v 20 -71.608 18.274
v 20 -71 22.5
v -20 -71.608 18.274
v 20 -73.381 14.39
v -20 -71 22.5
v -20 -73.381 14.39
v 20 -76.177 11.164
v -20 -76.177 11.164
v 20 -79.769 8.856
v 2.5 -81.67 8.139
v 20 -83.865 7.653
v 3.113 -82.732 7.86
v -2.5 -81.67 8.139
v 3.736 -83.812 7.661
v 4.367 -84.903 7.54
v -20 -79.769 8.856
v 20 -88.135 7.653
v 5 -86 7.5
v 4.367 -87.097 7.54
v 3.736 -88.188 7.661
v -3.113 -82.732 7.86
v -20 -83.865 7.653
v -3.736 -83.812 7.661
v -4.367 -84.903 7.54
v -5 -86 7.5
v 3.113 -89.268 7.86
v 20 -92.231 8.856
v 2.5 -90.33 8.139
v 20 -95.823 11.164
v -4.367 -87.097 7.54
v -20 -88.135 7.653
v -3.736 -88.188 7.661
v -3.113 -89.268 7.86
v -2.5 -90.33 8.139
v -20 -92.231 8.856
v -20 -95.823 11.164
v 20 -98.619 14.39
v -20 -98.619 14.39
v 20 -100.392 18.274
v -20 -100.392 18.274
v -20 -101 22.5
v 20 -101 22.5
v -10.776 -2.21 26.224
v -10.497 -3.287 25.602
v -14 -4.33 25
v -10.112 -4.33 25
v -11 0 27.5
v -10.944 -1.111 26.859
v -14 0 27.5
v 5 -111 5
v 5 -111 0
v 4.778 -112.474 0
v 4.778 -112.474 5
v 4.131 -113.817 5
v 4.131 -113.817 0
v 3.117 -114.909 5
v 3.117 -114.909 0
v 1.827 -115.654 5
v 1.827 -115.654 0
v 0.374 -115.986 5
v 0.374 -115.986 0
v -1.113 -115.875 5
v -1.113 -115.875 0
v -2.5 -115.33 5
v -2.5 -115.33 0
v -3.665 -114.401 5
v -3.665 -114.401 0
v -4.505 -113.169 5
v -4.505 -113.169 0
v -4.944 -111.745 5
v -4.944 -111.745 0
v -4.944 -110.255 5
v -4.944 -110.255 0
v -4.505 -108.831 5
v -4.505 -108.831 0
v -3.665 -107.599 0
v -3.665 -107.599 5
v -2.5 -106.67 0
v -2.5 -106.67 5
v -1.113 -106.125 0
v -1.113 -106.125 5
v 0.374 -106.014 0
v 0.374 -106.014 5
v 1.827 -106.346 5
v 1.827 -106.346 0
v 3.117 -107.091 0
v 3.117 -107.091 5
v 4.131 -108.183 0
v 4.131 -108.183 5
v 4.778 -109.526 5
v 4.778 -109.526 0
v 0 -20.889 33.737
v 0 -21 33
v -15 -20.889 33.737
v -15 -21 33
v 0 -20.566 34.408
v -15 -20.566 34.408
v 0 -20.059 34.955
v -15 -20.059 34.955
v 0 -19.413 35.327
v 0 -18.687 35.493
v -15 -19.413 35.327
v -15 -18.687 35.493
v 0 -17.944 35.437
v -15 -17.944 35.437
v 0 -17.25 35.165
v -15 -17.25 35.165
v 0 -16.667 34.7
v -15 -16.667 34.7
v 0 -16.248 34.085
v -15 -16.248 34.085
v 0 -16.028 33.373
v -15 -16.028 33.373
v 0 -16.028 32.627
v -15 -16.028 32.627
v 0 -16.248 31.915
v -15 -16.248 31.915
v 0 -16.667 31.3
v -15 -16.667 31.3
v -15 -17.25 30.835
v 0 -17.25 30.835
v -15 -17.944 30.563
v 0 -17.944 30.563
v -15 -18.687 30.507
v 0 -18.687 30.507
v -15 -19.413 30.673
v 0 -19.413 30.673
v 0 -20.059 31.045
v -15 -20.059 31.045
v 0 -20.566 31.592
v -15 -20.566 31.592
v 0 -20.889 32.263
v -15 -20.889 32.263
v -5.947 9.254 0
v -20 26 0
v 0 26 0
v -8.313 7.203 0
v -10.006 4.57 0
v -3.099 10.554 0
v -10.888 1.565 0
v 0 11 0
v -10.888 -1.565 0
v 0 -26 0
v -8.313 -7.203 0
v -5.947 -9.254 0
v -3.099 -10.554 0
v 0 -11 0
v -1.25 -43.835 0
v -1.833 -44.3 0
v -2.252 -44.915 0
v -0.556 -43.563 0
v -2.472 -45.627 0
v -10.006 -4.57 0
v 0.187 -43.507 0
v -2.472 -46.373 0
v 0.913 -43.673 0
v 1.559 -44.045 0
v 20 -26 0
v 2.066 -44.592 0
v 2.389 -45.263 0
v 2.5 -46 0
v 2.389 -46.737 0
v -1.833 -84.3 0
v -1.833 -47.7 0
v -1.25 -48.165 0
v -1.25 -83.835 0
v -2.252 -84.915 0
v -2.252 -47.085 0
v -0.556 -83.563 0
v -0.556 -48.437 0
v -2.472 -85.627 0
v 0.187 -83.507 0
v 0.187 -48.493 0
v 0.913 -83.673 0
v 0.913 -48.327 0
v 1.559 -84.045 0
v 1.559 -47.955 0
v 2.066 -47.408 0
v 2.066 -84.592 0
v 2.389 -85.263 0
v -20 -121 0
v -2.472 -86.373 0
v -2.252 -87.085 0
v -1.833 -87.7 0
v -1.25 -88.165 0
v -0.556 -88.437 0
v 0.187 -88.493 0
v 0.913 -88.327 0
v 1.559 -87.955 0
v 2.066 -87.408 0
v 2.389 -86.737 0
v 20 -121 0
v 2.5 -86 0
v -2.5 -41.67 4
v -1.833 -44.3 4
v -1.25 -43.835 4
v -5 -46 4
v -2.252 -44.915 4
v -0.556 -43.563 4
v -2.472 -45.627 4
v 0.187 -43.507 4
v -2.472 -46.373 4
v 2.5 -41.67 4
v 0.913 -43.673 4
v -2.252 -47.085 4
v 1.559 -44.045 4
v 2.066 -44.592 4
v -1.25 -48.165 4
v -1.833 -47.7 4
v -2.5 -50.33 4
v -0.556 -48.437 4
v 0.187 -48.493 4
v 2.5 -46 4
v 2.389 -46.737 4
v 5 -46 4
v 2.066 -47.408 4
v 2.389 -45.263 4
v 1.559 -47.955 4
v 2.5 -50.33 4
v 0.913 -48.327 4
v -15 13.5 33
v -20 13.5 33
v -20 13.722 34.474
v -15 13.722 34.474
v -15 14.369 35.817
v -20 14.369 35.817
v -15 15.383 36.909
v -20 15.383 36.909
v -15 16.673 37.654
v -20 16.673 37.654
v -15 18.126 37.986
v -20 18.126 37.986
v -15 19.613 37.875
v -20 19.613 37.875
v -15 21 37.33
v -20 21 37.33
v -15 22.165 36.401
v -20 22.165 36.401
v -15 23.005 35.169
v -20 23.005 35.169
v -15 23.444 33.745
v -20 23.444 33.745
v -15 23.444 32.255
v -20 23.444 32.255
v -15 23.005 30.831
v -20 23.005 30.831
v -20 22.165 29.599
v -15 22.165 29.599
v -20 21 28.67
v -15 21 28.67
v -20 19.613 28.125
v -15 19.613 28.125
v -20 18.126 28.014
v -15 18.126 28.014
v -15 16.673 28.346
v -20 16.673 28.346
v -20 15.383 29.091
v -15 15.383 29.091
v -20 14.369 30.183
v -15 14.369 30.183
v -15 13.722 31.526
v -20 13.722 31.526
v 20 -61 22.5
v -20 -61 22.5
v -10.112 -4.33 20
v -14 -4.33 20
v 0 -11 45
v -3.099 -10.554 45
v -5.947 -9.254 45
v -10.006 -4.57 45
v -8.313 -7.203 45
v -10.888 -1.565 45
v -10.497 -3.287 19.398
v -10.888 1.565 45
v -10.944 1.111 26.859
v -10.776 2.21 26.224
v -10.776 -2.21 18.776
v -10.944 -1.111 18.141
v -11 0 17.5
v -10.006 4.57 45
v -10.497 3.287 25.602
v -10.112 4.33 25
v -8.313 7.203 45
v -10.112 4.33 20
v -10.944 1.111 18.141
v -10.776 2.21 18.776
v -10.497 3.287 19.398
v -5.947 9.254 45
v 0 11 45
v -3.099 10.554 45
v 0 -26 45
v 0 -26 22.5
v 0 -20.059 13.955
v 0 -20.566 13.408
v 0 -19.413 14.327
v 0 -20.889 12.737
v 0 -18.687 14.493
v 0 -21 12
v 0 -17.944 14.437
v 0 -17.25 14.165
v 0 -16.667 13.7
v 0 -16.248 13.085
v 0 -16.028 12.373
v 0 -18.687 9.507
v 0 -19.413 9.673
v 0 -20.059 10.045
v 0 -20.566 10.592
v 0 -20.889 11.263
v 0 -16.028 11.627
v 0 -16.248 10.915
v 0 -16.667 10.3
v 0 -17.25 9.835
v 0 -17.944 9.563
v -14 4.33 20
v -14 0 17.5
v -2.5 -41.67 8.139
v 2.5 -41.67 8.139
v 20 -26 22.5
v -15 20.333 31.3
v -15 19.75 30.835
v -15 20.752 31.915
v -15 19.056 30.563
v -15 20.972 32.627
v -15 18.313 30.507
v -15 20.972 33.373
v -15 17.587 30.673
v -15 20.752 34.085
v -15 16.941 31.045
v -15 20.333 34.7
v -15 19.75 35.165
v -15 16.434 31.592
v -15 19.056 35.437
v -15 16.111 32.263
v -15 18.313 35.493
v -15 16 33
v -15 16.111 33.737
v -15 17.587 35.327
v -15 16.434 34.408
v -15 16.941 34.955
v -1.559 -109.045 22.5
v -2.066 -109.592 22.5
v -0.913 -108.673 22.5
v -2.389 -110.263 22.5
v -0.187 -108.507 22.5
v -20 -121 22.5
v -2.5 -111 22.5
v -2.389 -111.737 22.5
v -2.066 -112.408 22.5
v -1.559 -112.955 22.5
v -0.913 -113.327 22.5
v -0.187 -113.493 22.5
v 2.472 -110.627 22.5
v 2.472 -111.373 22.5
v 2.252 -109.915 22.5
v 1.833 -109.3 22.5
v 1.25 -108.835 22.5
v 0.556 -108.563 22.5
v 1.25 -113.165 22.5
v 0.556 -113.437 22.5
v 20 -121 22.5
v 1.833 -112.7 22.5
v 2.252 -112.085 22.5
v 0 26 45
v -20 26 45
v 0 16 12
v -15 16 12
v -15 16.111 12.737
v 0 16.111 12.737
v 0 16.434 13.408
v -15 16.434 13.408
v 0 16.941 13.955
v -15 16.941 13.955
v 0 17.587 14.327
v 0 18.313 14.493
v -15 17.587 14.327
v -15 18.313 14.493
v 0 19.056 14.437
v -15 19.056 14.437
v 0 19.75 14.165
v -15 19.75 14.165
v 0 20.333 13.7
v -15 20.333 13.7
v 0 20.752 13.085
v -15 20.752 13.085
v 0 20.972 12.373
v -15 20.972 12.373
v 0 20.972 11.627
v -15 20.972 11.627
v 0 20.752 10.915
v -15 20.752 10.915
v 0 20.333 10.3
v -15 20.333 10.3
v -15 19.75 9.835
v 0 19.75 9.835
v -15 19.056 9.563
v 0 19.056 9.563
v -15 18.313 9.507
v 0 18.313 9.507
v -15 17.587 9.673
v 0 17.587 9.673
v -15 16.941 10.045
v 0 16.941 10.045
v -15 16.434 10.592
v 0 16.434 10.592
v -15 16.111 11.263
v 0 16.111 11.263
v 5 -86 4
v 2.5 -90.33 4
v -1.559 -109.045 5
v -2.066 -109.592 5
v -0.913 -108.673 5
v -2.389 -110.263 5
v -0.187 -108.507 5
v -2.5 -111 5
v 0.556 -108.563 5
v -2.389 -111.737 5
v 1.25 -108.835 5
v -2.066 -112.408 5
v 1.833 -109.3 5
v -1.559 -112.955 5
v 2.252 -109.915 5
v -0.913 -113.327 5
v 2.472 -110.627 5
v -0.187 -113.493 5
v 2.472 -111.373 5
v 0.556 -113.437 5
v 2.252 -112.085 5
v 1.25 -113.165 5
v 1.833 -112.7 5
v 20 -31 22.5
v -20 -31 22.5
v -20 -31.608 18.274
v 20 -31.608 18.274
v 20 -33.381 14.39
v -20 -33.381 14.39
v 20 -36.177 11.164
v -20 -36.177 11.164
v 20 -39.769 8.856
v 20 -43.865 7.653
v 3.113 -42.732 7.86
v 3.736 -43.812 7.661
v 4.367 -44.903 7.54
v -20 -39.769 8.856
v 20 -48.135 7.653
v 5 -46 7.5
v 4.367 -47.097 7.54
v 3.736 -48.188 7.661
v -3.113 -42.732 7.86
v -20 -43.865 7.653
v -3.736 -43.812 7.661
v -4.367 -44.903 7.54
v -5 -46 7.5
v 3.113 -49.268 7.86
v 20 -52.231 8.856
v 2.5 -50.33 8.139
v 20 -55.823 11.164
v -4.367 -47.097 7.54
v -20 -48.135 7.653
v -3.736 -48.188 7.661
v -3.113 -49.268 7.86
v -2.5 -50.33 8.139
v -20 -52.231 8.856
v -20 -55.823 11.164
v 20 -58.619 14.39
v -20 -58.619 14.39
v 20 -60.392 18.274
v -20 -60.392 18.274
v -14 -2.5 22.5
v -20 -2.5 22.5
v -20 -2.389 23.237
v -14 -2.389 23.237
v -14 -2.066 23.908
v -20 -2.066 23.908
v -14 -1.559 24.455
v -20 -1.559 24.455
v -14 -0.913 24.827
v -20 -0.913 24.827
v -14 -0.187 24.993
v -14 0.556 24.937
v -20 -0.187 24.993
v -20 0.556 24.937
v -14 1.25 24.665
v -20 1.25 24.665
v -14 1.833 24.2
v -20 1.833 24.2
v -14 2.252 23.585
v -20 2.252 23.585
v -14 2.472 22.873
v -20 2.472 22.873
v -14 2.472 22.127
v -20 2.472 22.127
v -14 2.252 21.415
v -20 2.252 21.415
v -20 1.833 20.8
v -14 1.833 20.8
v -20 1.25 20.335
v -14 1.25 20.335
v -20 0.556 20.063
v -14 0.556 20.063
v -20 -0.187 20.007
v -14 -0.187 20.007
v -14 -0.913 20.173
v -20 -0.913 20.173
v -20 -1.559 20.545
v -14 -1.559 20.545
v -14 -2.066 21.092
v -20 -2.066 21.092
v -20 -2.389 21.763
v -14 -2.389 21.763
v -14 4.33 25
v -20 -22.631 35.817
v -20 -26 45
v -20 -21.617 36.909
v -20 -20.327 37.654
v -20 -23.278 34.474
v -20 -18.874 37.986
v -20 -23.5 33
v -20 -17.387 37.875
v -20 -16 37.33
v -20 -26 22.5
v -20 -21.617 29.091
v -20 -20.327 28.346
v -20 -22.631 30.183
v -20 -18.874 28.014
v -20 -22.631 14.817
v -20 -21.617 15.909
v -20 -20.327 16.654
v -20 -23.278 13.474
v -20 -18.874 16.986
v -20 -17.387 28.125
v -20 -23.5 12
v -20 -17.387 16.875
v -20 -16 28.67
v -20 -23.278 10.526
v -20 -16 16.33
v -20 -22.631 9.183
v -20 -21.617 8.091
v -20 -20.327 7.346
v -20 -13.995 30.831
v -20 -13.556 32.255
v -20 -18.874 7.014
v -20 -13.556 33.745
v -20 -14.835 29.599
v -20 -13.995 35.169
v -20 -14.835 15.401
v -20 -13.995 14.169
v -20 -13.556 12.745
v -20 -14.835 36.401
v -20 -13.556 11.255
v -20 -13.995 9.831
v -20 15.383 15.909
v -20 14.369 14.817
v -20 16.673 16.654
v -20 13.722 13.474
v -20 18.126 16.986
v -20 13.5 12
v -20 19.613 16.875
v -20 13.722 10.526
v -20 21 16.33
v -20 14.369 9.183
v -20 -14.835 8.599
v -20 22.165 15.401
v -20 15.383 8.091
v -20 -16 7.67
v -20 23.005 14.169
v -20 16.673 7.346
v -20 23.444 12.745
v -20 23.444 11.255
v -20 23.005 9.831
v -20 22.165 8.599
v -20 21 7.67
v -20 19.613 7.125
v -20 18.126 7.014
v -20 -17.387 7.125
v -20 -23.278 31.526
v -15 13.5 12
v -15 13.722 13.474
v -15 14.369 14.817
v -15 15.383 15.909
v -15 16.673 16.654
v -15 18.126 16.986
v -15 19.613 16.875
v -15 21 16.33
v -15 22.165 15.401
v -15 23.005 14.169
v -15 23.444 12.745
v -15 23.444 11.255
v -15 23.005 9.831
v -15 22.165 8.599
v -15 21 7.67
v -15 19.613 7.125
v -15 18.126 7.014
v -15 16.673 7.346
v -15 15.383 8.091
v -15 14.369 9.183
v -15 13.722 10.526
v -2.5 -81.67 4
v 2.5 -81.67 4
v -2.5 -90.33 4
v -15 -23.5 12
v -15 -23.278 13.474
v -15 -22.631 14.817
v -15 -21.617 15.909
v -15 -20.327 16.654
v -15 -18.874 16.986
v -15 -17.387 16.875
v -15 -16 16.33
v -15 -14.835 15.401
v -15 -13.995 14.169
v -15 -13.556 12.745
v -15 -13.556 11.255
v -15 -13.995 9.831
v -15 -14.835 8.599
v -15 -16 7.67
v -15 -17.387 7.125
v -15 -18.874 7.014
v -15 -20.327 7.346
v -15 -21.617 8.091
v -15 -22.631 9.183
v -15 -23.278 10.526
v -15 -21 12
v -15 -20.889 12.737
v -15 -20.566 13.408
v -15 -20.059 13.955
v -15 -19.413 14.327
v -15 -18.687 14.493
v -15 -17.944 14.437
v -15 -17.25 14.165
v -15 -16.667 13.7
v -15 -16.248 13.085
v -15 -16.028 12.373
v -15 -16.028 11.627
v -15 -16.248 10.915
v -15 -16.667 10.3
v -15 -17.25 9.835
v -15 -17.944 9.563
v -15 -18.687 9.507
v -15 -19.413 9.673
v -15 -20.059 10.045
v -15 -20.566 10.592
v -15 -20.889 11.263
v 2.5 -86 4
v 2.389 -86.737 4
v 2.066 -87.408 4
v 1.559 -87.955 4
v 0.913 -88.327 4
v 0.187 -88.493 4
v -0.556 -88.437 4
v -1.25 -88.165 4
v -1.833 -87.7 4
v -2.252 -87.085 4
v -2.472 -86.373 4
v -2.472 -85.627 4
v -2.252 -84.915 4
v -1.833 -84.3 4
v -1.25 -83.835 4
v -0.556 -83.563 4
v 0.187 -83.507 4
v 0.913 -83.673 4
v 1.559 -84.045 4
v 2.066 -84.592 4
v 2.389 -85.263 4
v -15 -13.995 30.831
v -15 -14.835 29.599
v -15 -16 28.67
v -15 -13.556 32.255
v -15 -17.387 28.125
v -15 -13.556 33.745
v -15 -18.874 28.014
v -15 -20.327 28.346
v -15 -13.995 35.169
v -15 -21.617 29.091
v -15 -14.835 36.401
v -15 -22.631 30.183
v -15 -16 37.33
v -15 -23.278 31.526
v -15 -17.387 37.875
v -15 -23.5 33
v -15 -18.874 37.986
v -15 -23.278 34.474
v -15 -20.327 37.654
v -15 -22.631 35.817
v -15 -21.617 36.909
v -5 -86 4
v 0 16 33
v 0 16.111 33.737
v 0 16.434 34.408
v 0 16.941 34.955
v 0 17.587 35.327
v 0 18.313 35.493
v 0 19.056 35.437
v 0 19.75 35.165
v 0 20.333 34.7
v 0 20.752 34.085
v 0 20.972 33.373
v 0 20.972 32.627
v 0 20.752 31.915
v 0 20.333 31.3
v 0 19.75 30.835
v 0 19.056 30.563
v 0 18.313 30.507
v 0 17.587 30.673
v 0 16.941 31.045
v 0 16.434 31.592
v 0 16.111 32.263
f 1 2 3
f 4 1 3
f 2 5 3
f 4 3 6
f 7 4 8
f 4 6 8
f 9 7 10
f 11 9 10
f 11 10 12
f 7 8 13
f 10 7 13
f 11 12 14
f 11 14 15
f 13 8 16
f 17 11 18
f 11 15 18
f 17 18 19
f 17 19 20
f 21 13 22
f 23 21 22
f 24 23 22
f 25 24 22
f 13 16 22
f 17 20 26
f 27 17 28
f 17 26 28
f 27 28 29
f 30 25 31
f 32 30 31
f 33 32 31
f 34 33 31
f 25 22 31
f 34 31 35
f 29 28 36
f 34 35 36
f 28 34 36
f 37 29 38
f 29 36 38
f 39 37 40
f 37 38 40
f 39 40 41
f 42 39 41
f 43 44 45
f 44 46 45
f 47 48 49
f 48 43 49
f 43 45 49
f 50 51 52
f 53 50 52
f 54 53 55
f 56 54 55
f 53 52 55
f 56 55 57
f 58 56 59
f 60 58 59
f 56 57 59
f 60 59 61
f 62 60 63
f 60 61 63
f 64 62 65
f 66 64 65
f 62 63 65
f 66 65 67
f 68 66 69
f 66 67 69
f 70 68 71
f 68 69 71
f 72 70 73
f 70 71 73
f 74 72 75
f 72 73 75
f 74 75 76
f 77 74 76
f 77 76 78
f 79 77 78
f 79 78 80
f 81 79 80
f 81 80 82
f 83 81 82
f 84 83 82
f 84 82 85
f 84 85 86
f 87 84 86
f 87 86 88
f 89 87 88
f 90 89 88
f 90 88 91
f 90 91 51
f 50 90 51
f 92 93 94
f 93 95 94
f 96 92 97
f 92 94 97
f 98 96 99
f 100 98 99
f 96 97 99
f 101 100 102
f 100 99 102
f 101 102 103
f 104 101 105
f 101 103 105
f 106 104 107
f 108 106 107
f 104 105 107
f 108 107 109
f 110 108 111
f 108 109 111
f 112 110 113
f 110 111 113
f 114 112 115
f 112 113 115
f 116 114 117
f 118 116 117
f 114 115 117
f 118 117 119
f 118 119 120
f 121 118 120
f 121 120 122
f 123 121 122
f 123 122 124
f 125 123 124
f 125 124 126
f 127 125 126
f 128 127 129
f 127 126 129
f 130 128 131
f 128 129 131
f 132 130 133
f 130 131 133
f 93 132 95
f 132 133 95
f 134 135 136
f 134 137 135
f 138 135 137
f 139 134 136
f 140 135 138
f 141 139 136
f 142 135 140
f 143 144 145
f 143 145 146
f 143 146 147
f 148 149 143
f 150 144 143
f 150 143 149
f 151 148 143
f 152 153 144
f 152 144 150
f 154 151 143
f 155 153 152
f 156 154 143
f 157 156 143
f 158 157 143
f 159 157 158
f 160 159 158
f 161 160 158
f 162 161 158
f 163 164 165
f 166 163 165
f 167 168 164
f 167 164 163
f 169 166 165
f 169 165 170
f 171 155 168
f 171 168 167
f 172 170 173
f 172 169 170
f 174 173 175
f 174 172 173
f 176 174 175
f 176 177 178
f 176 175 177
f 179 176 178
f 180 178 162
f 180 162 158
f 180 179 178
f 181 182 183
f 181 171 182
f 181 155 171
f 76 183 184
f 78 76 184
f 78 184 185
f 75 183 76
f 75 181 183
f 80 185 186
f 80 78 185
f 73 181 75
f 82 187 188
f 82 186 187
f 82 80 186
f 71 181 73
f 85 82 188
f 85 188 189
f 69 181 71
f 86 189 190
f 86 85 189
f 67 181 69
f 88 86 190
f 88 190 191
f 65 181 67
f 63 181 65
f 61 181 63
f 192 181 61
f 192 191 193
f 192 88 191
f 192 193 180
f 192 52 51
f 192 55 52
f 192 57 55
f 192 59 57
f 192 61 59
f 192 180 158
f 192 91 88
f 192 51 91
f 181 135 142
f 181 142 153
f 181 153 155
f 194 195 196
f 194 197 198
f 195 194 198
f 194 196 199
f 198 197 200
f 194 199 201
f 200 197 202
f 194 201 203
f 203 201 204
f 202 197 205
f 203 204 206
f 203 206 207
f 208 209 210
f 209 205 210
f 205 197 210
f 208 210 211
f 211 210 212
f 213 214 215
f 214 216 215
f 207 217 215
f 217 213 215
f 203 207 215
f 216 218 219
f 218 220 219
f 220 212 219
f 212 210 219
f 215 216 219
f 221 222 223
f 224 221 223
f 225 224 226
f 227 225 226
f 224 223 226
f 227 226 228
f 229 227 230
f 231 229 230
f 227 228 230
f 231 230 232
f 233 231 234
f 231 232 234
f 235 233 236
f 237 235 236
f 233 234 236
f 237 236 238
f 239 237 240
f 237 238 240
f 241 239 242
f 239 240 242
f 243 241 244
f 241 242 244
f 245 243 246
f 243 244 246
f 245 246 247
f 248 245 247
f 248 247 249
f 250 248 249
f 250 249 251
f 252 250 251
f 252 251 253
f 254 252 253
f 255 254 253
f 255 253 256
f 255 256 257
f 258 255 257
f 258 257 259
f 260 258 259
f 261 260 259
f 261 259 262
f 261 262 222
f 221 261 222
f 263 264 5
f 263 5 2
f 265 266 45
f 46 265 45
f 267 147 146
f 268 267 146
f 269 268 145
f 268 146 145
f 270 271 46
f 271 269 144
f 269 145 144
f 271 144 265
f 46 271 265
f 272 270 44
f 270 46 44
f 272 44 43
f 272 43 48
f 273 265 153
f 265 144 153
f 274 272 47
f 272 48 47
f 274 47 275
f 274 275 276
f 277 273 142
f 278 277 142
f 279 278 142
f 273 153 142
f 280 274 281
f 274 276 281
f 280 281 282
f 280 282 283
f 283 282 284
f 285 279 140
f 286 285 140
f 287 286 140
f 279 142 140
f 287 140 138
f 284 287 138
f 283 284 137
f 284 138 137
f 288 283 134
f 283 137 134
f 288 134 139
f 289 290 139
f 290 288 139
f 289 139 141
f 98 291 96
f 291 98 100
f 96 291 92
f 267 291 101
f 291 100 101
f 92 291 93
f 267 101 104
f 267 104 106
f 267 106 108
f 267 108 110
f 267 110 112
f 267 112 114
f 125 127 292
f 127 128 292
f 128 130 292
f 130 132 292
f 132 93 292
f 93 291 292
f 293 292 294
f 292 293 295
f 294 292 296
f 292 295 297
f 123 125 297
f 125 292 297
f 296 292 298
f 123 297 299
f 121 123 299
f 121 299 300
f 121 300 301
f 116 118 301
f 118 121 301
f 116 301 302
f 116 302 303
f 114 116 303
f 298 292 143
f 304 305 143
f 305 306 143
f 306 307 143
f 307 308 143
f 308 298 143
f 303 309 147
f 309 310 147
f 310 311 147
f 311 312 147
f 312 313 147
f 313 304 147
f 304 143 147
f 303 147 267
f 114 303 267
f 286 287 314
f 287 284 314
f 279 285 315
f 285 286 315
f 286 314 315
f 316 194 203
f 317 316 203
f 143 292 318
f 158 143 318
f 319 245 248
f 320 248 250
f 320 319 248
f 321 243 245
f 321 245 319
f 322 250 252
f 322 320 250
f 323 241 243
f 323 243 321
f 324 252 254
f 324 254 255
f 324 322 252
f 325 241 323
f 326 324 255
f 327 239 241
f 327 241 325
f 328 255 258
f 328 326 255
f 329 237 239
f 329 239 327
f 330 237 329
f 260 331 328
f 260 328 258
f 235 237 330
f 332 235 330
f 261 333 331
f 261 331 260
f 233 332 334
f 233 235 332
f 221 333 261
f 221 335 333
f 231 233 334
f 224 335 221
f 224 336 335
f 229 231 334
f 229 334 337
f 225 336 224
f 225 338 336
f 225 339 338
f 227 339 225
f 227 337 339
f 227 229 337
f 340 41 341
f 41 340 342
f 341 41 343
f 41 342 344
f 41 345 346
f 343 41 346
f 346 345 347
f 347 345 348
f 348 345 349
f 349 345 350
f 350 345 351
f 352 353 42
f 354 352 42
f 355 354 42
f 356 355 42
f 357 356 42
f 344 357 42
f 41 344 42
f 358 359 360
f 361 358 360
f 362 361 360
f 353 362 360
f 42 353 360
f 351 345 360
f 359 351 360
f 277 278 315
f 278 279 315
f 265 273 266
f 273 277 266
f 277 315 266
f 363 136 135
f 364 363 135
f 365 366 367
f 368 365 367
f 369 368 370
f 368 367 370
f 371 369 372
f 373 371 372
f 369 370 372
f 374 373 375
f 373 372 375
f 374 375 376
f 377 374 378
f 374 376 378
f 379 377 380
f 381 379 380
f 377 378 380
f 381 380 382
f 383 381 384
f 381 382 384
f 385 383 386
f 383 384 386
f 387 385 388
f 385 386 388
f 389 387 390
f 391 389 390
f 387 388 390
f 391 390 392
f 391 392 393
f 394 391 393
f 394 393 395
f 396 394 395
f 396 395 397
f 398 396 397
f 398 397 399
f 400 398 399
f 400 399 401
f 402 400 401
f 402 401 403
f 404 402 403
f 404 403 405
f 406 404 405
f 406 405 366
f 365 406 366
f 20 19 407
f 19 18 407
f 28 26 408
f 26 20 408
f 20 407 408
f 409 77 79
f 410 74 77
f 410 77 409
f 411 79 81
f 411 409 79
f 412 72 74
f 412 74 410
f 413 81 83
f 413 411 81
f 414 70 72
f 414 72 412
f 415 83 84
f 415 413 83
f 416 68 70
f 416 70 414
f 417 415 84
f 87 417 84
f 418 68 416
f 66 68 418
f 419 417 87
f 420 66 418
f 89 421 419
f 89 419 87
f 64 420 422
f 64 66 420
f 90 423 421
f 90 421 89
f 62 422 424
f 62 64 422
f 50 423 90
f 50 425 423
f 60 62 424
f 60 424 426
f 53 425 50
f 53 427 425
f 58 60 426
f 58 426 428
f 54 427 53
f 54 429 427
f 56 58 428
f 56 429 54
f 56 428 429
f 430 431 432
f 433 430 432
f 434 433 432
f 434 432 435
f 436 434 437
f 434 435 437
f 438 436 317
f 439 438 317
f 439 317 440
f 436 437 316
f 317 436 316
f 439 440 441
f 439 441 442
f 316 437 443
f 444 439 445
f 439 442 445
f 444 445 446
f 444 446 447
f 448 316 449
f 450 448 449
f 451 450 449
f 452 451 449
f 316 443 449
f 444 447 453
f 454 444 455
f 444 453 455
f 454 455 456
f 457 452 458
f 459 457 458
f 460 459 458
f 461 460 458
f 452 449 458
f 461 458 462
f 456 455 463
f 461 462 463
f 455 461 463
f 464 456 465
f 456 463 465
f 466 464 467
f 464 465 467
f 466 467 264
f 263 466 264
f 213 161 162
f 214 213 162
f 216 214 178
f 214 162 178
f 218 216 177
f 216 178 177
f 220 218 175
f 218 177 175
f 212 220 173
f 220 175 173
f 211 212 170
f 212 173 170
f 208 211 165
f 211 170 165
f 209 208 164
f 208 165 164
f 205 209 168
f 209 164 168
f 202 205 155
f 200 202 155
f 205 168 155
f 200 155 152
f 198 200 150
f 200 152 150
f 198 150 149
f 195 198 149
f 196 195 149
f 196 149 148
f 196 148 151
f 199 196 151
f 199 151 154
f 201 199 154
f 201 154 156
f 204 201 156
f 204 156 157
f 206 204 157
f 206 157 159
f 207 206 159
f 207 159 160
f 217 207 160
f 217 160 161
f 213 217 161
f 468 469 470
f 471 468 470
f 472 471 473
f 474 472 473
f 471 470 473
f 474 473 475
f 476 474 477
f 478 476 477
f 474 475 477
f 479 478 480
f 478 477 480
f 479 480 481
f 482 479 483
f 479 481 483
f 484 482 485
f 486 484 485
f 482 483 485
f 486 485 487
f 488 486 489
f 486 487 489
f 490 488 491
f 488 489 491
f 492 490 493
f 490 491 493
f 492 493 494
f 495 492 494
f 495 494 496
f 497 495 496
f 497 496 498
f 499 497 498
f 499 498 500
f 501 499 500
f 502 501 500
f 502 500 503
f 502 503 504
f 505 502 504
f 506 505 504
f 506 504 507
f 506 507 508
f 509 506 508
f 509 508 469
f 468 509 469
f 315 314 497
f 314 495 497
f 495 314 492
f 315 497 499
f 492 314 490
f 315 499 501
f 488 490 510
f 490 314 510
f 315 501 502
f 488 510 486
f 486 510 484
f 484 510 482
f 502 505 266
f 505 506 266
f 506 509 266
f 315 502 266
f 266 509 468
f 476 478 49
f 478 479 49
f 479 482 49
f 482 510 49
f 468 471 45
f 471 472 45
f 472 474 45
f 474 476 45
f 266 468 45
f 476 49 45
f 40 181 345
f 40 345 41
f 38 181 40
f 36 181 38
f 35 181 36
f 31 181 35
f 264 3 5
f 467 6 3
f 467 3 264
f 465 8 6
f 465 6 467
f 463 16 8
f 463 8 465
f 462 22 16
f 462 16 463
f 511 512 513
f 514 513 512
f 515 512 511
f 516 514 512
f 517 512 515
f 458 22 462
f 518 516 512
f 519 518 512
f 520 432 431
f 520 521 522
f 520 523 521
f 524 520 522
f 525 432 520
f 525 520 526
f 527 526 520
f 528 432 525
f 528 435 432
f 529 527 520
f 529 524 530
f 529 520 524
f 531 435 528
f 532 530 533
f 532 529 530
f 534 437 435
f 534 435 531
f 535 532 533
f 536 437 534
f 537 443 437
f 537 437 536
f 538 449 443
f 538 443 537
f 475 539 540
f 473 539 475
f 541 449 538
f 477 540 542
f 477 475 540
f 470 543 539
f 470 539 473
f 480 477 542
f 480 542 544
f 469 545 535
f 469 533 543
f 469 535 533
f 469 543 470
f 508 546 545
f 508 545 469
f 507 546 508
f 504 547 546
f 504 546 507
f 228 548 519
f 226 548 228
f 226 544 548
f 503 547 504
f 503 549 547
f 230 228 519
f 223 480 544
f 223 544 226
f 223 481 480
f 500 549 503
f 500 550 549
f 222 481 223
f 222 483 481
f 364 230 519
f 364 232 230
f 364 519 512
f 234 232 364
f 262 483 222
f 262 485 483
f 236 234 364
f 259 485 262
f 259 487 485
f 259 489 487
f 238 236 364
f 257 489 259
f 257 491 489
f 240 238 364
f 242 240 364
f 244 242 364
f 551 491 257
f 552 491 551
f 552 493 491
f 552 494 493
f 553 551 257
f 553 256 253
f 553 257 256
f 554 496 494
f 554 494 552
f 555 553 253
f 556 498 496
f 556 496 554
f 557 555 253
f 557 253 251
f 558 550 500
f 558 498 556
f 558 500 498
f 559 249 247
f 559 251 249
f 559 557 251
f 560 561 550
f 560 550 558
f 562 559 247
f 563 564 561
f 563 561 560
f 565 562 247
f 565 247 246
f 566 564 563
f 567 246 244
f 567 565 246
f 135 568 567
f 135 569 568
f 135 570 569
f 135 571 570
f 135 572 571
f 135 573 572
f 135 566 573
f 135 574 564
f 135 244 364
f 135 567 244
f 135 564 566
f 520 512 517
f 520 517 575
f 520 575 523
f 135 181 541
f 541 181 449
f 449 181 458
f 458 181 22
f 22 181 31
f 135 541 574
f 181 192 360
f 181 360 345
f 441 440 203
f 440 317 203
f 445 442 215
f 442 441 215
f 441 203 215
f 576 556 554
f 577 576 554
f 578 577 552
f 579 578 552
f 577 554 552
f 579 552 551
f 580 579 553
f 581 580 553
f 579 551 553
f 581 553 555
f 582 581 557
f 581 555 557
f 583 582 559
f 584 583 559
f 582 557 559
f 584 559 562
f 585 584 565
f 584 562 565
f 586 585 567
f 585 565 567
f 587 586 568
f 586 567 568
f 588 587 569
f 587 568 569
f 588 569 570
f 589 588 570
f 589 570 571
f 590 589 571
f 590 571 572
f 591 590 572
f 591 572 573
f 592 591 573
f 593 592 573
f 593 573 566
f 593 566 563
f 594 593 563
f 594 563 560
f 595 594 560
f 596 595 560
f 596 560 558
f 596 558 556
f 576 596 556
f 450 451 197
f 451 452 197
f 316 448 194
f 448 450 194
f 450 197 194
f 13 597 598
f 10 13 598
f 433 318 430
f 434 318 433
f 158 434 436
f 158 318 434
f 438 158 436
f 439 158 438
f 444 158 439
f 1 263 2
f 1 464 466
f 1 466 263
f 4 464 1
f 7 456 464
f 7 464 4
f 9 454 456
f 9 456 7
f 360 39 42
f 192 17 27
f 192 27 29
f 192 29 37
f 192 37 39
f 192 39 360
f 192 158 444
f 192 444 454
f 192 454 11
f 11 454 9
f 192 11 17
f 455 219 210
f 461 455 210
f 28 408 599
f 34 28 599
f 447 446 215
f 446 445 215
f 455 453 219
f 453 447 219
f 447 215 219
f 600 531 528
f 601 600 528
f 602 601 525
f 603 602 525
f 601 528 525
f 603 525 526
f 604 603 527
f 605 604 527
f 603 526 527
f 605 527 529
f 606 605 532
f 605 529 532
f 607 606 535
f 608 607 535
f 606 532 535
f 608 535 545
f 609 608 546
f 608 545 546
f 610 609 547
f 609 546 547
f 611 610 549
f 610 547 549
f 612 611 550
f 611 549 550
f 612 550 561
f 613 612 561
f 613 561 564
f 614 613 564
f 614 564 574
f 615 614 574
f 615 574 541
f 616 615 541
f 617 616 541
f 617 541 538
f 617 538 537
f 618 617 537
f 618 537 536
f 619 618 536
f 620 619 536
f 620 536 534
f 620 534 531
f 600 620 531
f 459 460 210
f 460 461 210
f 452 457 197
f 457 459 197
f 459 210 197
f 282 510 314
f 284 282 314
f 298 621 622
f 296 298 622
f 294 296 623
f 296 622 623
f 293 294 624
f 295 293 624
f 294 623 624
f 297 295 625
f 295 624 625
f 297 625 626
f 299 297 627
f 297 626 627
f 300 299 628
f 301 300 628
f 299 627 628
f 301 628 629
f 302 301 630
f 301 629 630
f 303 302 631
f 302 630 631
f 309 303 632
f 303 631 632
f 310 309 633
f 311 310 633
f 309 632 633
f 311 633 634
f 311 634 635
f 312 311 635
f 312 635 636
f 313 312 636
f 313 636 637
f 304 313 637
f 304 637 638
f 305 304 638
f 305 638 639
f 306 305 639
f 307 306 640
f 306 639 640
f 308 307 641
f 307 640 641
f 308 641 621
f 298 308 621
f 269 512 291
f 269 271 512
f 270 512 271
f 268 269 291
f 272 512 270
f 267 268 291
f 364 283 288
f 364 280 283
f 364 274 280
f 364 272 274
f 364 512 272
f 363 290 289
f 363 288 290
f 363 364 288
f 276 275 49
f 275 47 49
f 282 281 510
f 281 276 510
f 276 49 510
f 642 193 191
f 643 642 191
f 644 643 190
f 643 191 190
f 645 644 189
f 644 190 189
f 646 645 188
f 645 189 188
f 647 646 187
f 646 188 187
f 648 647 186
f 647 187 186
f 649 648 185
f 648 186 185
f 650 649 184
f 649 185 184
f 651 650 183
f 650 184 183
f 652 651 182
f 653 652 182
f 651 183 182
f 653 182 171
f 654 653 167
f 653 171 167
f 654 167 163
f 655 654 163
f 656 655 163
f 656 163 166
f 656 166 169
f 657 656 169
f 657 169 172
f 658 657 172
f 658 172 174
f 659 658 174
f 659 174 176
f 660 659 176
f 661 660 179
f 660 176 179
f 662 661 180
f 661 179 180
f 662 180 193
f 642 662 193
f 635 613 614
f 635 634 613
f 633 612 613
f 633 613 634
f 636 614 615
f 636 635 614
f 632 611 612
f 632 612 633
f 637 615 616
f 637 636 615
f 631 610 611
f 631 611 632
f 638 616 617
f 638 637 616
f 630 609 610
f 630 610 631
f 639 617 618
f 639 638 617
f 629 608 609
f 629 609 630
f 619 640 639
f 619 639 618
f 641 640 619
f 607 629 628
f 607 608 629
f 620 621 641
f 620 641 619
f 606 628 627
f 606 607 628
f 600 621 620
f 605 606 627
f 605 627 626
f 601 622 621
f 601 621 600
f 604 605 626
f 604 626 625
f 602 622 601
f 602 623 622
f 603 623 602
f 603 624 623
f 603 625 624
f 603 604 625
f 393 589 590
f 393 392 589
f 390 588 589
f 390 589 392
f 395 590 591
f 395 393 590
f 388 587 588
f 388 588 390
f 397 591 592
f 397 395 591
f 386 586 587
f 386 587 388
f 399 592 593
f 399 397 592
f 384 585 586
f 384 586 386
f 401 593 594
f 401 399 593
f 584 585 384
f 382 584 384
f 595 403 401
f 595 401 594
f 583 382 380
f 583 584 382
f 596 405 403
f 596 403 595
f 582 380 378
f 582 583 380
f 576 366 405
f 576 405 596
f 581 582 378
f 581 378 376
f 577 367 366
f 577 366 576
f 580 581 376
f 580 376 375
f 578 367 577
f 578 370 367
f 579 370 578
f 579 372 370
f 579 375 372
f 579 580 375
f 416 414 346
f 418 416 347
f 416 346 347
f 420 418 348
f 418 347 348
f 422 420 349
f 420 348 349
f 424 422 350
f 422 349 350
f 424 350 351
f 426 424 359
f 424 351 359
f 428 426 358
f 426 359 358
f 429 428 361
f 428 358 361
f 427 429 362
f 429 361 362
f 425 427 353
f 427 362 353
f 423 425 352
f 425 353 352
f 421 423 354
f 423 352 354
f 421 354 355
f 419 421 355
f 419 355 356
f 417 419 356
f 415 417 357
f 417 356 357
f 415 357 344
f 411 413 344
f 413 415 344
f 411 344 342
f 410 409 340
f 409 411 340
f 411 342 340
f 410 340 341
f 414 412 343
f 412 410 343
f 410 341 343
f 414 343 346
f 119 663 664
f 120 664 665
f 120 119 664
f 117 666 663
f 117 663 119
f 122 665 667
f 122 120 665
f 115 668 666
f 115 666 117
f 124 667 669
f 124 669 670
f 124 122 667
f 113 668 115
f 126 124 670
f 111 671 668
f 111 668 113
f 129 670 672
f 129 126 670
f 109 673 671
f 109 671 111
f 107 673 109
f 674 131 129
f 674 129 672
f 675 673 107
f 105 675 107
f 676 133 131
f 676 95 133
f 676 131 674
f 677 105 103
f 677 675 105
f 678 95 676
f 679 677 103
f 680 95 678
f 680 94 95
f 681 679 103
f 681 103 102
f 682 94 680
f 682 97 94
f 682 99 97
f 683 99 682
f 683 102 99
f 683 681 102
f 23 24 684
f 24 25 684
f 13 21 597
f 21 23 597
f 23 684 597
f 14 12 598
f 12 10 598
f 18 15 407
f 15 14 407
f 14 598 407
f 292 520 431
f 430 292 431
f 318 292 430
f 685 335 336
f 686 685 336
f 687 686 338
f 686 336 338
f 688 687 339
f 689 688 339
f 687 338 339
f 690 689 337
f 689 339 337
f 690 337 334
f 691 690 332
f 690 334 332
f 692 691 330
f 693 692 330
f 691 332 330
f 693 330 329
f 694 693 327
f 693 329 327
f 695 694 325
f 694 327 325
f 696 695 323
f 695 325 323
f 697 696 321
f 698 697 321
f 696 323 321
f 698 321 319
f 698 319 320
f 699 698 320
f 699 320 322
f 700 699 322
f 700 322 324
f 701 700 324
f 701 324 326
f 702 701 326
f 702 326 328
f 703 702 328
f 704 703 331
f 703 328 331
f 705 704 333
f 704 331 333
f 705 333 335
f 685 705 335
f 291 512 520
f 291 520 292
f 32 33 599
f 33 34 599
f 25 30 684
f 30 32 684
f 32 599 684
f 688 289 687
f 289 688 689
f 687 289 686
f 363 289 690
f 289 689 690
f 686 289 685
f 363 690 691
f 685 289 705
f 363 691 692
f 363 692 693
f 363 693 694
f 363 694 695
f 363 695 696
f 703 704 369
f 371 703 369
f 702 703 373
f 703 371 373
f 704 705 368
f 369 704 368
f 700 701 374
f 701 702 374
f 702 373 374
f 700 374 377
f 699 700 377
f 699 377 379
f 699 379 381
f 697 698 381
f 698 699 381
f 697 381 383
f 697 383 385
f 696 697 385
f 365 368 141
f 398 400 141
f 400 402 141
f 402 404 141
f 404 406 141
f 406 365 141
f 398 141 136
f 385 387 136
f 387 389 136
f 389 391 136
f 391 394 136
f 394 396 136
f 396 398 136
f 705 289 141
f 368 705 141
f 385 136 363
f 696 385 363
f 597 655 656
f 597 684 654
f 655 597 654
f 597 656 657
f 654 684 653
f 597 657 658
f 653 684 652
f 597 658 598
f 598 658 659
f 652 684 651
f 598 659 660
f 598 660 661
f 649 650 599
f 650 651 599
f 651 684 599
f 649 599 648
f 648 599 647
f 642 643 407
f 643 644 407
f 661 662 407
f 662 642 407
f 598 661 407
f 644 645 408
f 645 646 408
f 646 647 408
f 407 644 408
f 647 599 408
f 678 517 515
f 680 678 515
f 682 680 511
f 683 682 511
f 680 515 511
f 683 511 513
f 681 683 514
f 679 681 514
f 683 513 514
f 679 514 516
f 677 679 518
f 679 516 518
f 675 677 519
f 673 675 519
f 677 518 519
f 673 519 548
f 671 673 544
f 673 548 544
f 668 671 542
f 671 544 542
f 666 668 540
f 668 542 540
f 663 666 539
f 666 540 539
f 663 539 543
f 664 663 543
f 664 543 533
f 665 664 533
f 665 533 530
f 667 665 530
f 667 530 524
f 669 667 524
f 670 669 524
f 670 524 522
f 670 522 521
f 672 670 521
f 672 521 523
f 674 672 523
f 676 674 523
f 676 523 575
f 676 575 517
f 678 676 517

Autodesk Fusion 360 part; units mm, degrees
sketch "Sketch3" plane through (0, 0, 0) normal (0, 0, 1) x (1, 0, 0)
  circle A0 centre (0, 0) radius 11
  line L0 (0, 11) -> (0, 26)
  line L1 (0, 26) -> (-20, 26)
  line L2 (-20, 26) -> (-20, -26)
  line L3 (-20, -26) -> (0, -26)
  line L4 (0, -26) -> (0, -11)
  line L5 (0, -26) -> (20, -26)
  line L6 (-20, -26) -> (-20, -106)
  line L7 (-20, -106) -> (20, -106)
  line L8 (20, -106) -> (20, -26)
  dimension "d15" = 22
  dimension "d16" = 15
  dimension "d17" = 20
  dimension "d18" = 52
  dimension "d19" = 20
  dimension "d20" = 80
  dimension "d21" = 40
extrude "Extrude4" add sketch "Sketch3" along normal blind 45 contours A0 L0 L1 L2 L3 L4
extrude "Extrude5" add sketch "Sketch3" along normal blind 22.5 contours L3 L5 L6 L7 L8
sketch "Sketch4" plane through (-20, 0, 0) normal (-1, 0, 0) x (0, -1, 0)
  line L0 (-26, 0) -> (106, 0)
  line L1 (106, 0) -> (106, 22.5)
  line L2 (106, 22.5) -> (26, 22.5)
  line L3 (26, 22.5) -> (26, 45)
  line L4 (26, 45) -> (-26, 45)
  line L5 (-26, 45) -> (-26, 0)
  line L6 (-26, 45) -> (-18.5, 45) construction
  line L7 (26, 45) -> (18.5, 45) construction
  line L8 (-18.5, 45) -> (-18.5, 33) construction
  circle A0 centre (-18.5, 33) radius 2.5
  circle A1 centre (18.5, 33) radius 2.5
  circle A2 centre (-18.5, 12) radius 2.5
  circle A3 centre (18.5, 12) radius 2.5
  line L9 (-26, 45) -> (26, 45) construction
  line L10 (0, 45) -> (0, 0) construction
  circle A4 centre (0, 22.5) radius 2.5
  dimension "d26" = 7.5
  dimension "d27" = 7.5
  dimension "d28" = 12
  dimension "d29" = 5
  dimension "d32" = 37
  dimension "d33" = -21
  dimension "d36" = 5
extrude "Extrude6" cut sketch "Sketch4" against normal blind 40 contours A0 | A1 | A2 | A3 | A4
sketch "Sketch5" plane through (-20, 0, 0) normal (-1, 0, 0) x (0, -1, 0)
  circle A0 centre (18.5, 33) radius 2.5
  circle A1 centre (18.5, 12) radius 2.5
  circle A2 centre (-18.5, 33) radius 2.5
  circle A3 centre (-18.5, 12) radius 2.5
  line L0 (-26, 0) -> (106, 0)
  line L1 (106, 0) -> (106, 22.5)
  line L2 (106, 22.5) -> (26, 22.5)
  line L3 (26, 22.5) -> (26, 45)
  line L4 (26, 45) -> (-26, 45)
  line L5 (-26, 45) -> (-26, 0)
  circle A4 centre (0, 22.5) radius 2.5
  circle A5 centre (-18.5, 33) radius 5
  circle A6 centre (18.5, 33) radius 5
  circle A7 centre (-18.5, 12) radius 5
  circle A8 centre (18.5, 12) radius 5
  dimension "d37" = 10
  dimension "d40" = 37
  dimension "d41" = -21
sketch "Sketch6" plane through (-20, 0, 0) normal (-1, 0, 0) x (0, -1, 0)
  line L0 (106, 22.5) -> (86, 22.5) construction
  circle A0 centre (86, 22.5) radius 15
  circle A1 centre (46, 22.5) radius 15
  dimension "d42" = 20
  dimension "d43" = 30
  dimension "d46" = -40
  dimension "d47" = 0
extrude "Extrude7" cut sketch "Sketch6" against normal blind 400
sketch "Sketch7" plane through (-20, 0, 0) normal (-1, 0, 0) x (0, -1, 0)
  line L0 (0, 22.5) -> (0, 27.5) construction
  line L1 (0, 27.5) -> (-4.3301, 25)
  line L2 (-4.3301, 25) -> (-4.3301, 20)
  line L3 (-4.3301, 20) -> (0, 17.5)
  line L4 (0, 17.5) -> (4.3301, 20)
  line L5 (4.3301, 20) -> (4.3301, 25)
  line L6 (4.3301, 25) -> (0, 27.5)
  point P0 (0, 22.5)
  dimension "d50" = 5
extrude "Extrude8" cut sketch "Sketch7" against normal blind 5 from surface at -6
sketch "Sketch8" plane through (0, 0, 0) normal (0, 0, -1) x (1, 0, 0)
  line L0 (0, -26) -> (0, -11)
  arc A0 (0, 11) -> (0, -11) centre (0, 0) ccw
  line L1 (0, 11) -> (0, 26)
  line L2 (0, 26) -> (20, 26)
  line L3 (20, 26) -> (20, 106)
  line L4 (20, 106) -> (-20, 106)
  line L5 (-20, 106) -> (-20, -26)
  line L6 (-20, -26) -> (0, -26)
  line L7 (0, 26) -> (0, 46) construction
  circle A1 centre (0, 46) radius 2.5
  circle A2 centre (0, 86) radius 2.5
  dimension "d54" = 20
  dimension "d55" = 5
  dimension "d58" = 0
  dimension "d59" = 40
extrude "Extrude9" cut sketch "Sketch8" against normal blind 20 contours A1 | A2
sketch "Sketch9" plane through (0, 0, 0) normal (0, 0, -1) x (1, 0, 0)
  circle A0 centre (0, 46) radius 2.5
  circle A1 centre (0, 86) radius 2.5
  line L0 (0, -26) -> (0, -11)
  arc A2 (0, 11) -> (0, -11) centre (0, 0) ccw
  line L1 (0, 11) -> (0, 26)
  line L2 (0, 26) -> (20, 26)
  line L3 (20, 26) -> (20, 106)
  line L4 (20, 106) -> (-20, 106)
  line L5 (-20, 106) -> (-20, -26)
  line L6 (-20, -26) -> (0, -26)
  line L7 (0, 46) -> (-5, 46) construction
  line L8 (0, 86) -> (-5, 86) construction
  line L9 (-5, 46) -> (-2.5, 41.6699)
  line L10 (-2.5, 41.6699) -> (2.5, 41.6699)
  line L11 (2.5, 41.6699) -> (5, 46)
  line L12 (5, 46) -> (2.5, 50.3301)
  line L13 (2.5, 50.3301) -> (-2.5, 50.3301)
  line L14 (-2.5, 50.3301) -> (-5, 46)
  line L15 (-5, 86) -> (-2.5, 81.6699)
  line L16 (-2.5, 81.6699) -> (2.5, 81.6699)
  line L17 (2.5, 81.6699) -> (5, 86)
  line L18 (5, 86) -> (2.5, 90.3301)
  line L19 (2.5, 90.3301) -> (-2.5, 90.3301)
  line L20 (-2.5, 90.3301) -> (-5, 86)
  point P0 (0, 46)
  point P1 (0, 86)
  dimension "d62" = 5
  dimension "d63" = 5
extrude "Extrude10" cut sketch "Sketch9" against normal blind 6 from surface at -4 contours L9 L10 L11 L12 L13 L14 | L15 L16 L17 L18 L19 L20
sketch "Sketch10" plane through (-20, 0, 0) normal (-1, 0, 0) x (0, -1, 0)
  arc A0 (71, 22.5) -> (101, 22.5) centre (86, 22.5) ccw
  line L0 (71, 22.5) -> (61, 22.5)
  arc A1 (31, 22.5) -> (61, 22.5) centre (46, 22.5) ccw
  line L1 (31, 22.5) -> (26, 22.5)
  line L2 (26, 22.5) -> (26, 45)
  line L3 (26, 45) -> (-26, 45)
  line L4 (-26, 45) -> (-26, 0)
  line L5 (-26, 0) -> (106, 0)
  line L6 (106, 0) -> (106, 22.5)
  line L7 (106, 22.5) -> (101, 22.5)
  circle A2 centre (0, 22.5) radius 2.5
  circle A3 centre (-18.5, 33) radius 2.5
  circle A4 centre (-18.5, 12) radius 2.5
  circle A5 centre (18.5, 33) radius 2.5
  circle A6 centre (18.5, 12) radius 2.5
  circle A7 centre (-18.5, 12) radius 5
  circle A8 centre (-18.5, 33) radius 5
  circle A9 centre (18.5, 33) radius 5
  circle A10 centre (18.5, 12) radius 5
  dimension "d67" = 10
  dimension "d68" = 10
  dimension "d69" = 10
  dimension "d70" = 10
extrude "Extrude11" cut sketch "Sketch10" against normal blind 5 contours A7 | A8 | A9 | A10
sketch "Sketch11" plane through (0, 0, 0) normal (0, 0, -1) x (1, 0, 0)
  circle A0 centre (0, 46) radius 2.5
  circle A1 centre (0, 86) radius 2.5
  line L0 (0, -26) -> (0, -11)
  arc A2 (0, 11) -> (0, -11) centre (0, 0) ccw
  line L1 (0, 11) -> (0, 26)
  line L2 (0, 26) -> (20, 26)
  line L3 (20, 26) -> (20, 106)
  line L4 (20, 106) -> (-20, 106)
  line L5 (-20, 106) -> (-20, -26)
  line L6 (-20, -26) -> (0, -26)
  line L7 (-20, 106) -> (20, 106)
  line L8 (20, 106) -> (20, 121)
  line L9 (20, 121) -> (-20, 121)
  line L10 (-20, 121) -> (-20, 106)
  dimension "d73" = 15
extrude "Extrude12" add sketch "Sketch11" against normal blind 22.5 contours L4 L7 L8 L9 L10
sketch "Sketch12" plane through (0, 0, 22.5) normal (0, 0, 1) x (-1, 0, 0)
  line L0 (-20, 101) -> (20, 101)
  line L1 (20, 101) -> (20, 121)
  line L2 (20, 121) -> (-20, 121)
  line L3 (-20, 121) -> (-20, 101)
  line L4 (0, 101) -> (0, 121) construction
  circle A0 centre (0, 111) radius 2.5
  dimension "d76" = 5
extrude "Extrude13" cut sketch "Sketch12" against normal blind 22.5 contours A0
sketch "Sketch13" plane through (0, 0, 0) normal (0, 0, -1) x (1, 0, 0)
  circle A0 centre (0, 111) radius 2.5
  circle A1 centre (0, 46) radius 2.5
  circle A2 centre (0, 86) radius 2.5
  line L0 (0, -26) -> (0, -11)
  arc A3 (0, 11) -> (0, -11) centre (0, 0) ccw
  line L1 (0, 11) -> (0, 26)
  line L2 (0, 26) -> (20, 26)
  line L3 (20, 26) -> (20, 121)
  line L4 (20, 121) -> (-20, 121)
  line L5 (-20, 121) -> (-20, -26)
  line L6 (-20, -26) -> (0, -26)
  circle A4 centre (0, 111) radius 5
  dimension "d79" = 10
extrude "Extrude14" cut sketch "Sketch13" against normal blind 5 contours A4
equation "d51 = 0 mm - 6.00 mm"
